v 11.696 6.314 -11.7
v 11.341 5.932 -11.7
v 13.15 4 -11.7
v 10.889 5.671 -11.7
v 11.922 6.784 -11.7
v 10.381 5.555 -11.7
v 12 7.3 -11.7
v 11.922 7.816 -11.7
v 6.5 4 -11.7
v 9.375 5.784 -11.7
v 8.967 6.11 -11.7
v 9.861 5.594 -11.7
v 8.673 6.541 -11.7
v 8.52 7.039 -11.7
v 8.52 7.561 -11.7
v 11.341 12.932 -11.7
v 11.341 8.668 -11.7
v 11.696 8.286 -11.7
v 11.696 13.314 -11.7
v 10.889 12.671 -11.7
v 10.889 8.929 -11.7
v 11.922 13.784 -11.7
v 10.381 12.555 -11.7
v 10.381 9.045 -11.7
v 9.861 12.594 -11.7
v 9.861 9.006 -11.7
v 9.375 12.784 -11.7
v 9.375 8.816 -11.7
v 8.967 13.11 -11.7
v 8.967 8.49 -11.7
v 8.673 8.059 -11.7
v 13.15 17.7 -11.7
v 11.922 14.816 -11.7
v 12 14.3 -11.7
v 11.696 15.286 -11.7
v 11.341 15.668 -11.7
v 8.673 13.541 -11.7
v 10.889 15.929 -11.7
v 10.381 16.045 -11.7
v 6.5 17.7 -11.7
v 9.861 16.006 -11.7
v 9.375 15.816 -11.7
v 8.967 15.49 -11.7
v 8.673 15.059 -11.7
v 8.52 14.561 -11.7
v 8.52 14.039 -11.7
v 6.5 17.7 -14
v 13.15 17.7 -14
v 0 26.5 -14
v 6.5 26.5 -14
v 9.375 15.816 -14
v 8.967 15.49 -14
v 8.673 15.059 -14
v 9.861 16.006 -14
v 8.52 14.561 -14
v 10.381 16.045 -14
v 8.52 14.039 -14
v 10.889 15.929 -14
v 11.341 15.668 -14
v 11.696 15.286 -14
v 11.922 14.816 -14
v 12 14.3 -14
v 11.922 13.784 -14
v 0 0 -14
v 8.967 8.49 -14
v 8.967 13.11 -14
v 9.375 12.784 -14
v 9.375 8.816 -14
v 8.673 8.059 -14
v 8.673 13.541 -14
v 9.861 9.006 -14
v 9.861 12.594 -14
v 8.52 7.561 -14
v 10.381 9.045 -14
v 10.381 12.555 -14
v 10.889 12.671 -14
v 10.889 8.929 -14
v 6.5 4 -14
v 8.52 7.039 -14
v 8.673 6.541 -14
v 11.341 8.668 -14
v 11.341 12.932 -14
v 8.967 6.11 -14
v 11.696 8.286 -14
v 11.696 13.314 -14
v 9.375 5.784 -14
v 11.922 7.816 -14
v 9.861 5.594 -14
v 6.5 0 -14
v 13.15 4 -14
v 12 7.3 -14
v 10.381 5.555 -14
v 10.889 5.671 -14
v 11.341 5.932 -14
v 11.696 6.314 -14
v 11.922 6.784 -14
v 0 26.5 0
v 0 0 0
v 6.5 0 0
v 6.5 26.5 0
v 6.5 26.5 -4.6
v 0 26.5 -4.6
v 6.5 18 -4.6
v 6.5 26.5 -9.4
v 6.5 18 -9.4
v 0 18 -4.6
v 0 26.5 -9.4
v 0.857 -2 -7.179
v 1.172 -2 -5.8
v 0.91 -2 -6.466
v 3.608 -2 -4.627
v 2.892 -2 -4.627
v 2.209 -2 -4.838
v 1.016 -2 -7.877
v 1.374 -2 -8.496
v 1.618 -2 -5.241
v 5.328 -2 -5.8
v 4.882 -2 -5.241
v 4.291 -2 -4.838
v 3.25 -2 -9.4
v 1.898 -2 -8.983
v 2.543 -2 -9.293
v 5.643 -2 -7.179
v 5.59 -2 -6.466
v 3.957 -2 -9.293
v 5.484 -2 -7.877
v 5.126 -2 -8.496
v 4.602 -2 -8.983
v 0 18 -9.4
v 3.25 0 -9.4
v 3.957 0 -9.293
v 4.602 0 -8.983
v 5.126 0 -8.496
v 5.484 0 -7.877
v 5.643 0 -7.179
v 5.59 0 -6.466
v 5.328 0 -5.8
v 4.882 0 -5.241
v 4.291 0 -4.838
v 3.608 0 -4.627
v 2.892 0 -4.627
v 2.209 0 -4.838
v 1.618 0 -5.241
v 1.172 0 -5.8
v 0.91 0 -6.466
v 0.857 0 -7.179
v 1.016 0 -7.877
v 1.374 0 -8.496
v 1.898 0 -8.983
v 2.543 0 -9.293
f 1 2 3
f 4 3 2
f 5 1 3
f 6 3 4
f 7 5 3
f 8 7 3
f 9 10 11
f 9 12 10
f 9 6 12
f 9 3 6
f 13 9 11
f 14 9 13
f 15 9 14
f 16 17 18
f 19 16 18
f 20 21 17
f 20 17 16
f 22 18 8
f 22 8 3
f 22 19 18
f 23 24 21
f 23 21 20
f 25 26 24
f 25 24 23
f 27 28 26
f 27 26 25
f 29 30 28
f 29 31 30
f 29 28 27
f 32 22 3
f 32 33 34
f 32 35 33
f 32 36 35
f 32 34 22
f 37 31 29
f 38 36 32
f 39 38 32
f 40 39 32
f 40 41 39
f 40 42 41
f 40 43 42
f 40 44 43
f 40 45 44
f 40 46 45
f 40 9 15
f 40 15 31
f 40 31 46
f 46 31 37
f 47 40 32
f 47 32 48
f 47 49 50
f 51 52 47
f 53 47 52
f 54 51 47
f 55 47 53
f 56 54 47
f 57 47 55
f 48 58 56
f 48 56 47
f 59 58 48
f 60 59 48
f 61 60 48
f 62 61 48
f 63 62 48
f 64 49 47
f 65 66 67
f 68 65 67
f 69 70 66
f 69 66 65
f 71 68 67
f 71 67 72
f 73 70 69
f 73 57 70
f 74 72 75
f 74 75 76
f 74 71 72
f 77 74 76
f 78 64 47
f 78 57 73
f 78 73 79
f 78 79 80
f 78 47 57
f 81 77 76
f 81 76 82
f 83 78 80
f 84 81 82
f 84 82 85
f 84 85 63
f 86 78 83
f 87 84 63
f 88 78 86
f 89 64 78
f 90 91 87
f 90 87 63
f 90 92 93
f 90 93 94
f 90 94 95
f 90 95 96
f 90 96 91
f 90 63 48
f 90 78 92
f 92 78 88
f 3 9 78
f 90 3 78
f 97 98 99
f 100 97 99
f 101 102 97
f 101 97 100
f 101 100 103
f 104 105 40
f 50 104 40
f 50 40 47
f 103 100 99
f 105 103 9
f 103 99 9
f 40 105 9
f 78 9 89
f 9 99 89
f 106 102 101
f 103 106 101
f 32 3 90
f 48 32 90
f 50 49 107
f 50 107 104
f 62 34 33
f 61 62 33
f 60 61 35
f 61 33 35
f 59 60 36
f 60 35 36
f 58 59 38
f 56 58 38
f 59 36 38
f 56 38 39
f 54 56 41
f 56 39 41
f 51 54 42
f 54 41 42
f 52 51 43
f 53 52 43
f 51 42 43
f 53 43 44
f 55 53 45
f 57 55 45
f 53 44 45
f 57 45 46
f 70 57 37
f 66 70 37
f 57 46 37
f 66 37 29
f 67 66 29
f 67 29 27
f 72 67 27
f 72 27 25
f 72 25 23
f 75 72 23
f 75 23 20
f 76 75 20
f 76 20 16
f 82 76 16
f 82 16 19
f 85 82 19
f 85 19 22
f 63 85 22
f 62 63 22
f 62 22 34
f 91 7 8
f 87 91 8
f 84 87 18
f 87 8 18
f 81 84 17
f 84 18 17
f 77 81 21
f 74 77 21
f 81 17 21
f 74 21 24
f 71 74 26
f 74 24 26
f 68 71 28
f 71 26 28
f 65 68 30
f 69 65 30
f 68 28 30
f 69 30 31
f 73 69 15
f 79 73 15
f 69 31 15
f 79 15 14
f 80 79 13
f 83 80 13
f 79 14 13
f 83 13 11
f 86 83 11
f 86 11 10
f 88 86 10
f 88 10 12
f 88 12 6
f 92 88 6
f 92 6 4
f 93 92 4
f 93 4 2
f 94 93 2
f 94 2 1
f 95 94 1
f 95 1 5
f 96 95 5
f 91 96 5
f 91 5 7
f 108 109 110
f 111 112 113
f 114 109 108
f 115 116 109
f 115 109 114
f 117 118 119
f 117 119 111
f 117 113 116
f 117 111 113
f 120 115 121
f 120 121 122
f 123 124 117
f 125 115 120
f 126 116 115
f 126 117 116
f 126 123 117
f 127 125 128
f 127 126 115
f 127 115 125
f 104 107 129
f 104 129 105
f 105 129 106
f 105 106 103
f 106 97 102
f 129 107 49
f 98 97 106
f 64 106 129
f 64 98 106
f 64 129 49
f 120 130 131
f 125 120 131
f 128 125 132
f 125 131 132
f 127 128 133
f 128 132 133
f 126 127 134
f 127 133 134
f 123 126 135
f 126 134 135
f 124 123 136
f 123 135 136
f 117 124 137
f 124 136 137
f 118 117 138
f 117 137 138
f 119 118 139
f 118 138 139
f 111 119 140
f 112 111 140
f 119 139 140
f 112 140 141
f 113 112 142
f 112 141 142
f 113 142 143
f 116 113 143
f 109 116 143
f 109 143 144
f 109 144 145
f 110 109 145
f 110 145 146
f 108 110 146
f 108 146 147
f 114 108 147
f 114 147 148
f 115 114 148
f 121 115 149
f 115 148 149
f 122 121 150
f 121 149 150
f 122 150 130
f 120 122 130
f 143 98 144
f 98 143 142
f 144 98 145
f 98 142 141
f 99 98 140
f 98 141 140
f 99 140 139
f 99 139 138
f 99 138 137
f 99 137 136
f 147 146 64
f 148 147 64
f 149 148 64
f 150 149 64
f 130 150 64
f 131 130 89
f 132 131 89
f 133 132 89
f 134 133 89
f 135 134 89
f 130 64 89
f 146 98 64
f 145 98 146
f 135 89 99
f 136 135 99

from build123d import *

# Parameters (mm, degrees)
SKETCH_1_W          = 6.5
SKETCH_1_H          = 14
EXTRUDE_1_DEPTH     = 26.5
SKETCH_2_W          = 6.5
SKETCH_2_H          = 4.8
CUT_EXTRUDE_1_DEPTH = 8.5
SKETCH_3_W          = 2.3
SKETCH_3_H          = 13.7
EXTRUDE_2_DEPTH     = 6.65
SKETCH_4_R          = 1.75
CUT_EXTRUDE_2_DEPTH = 6.65
SKETCH_5_R          = 2.4
EXTRUDE_3_DEPTH     = 2


with BuildPart() as part:
    # 草图1 → 凸台-拉伸1 (new body)
    with BuildSketch(Plane(origin=(0, 0, 0), x_dir=(1, 0, 0), z_dir=(0, 1, 0))):
        with Locations((3.25, 7)):
            Rectangle(SKETCH_1_W, SKETCH_1_H)
    extrude(amount=EXTRUDE_1_DEPTH)

    # 草图2 → 切除-拉伸1 (cut)
    with BuildSketch(Plane(origin=(0, 26.5, 0), x_dir=(1, 0, 0), z_dir=(0, 1, 0))):
        with Locations((3.25, 7)):
            Rectangle(SKETCH_2_W, SKETCH_2_H)
    extrude(amount=-CUT_EXTRUDE_1_DEPTH, mode=Mode.SUBTRACT)

    # 草图3 → 凸台-拉伸2 (add)
    with BuildSketch(Plane(origin=(6.5, 0, 0), x_dir=(0, 0, -1), z_dir=(1, 0, 0))):
        with Locations((12.85, 10.85)):
            Rectangle(SKETCH_3_W, SKETCH_3_H)
    extrude(amount=EXTRUDE_2_DEPTH)

    # 草图4 → 切除-拉伸2 (cut)
    with BuildSketch(Plane.XY.offset(-11.7)):
        with Locations((10.25, 14.3)):
            Circle(SKETCH_4_R)
        with Locations((10.25, 7.3)):
            Circle(SKETCH_4_R)
    extrude(amount=-CUT_EXTRUDE_2_DEPTH, mode=Mode.SUBTRACT)

    # 草图5 → 凸台-拉伸3 (add)
    with BuildSketch(Plane.XZ):
        with Locations(Location((3.25, -7, 0), (0, 0, 270))):
            Circle(SKETCH_5_R)
    extrude(amount=EXTRUDE_3_DEPTH)


solid = part.part
